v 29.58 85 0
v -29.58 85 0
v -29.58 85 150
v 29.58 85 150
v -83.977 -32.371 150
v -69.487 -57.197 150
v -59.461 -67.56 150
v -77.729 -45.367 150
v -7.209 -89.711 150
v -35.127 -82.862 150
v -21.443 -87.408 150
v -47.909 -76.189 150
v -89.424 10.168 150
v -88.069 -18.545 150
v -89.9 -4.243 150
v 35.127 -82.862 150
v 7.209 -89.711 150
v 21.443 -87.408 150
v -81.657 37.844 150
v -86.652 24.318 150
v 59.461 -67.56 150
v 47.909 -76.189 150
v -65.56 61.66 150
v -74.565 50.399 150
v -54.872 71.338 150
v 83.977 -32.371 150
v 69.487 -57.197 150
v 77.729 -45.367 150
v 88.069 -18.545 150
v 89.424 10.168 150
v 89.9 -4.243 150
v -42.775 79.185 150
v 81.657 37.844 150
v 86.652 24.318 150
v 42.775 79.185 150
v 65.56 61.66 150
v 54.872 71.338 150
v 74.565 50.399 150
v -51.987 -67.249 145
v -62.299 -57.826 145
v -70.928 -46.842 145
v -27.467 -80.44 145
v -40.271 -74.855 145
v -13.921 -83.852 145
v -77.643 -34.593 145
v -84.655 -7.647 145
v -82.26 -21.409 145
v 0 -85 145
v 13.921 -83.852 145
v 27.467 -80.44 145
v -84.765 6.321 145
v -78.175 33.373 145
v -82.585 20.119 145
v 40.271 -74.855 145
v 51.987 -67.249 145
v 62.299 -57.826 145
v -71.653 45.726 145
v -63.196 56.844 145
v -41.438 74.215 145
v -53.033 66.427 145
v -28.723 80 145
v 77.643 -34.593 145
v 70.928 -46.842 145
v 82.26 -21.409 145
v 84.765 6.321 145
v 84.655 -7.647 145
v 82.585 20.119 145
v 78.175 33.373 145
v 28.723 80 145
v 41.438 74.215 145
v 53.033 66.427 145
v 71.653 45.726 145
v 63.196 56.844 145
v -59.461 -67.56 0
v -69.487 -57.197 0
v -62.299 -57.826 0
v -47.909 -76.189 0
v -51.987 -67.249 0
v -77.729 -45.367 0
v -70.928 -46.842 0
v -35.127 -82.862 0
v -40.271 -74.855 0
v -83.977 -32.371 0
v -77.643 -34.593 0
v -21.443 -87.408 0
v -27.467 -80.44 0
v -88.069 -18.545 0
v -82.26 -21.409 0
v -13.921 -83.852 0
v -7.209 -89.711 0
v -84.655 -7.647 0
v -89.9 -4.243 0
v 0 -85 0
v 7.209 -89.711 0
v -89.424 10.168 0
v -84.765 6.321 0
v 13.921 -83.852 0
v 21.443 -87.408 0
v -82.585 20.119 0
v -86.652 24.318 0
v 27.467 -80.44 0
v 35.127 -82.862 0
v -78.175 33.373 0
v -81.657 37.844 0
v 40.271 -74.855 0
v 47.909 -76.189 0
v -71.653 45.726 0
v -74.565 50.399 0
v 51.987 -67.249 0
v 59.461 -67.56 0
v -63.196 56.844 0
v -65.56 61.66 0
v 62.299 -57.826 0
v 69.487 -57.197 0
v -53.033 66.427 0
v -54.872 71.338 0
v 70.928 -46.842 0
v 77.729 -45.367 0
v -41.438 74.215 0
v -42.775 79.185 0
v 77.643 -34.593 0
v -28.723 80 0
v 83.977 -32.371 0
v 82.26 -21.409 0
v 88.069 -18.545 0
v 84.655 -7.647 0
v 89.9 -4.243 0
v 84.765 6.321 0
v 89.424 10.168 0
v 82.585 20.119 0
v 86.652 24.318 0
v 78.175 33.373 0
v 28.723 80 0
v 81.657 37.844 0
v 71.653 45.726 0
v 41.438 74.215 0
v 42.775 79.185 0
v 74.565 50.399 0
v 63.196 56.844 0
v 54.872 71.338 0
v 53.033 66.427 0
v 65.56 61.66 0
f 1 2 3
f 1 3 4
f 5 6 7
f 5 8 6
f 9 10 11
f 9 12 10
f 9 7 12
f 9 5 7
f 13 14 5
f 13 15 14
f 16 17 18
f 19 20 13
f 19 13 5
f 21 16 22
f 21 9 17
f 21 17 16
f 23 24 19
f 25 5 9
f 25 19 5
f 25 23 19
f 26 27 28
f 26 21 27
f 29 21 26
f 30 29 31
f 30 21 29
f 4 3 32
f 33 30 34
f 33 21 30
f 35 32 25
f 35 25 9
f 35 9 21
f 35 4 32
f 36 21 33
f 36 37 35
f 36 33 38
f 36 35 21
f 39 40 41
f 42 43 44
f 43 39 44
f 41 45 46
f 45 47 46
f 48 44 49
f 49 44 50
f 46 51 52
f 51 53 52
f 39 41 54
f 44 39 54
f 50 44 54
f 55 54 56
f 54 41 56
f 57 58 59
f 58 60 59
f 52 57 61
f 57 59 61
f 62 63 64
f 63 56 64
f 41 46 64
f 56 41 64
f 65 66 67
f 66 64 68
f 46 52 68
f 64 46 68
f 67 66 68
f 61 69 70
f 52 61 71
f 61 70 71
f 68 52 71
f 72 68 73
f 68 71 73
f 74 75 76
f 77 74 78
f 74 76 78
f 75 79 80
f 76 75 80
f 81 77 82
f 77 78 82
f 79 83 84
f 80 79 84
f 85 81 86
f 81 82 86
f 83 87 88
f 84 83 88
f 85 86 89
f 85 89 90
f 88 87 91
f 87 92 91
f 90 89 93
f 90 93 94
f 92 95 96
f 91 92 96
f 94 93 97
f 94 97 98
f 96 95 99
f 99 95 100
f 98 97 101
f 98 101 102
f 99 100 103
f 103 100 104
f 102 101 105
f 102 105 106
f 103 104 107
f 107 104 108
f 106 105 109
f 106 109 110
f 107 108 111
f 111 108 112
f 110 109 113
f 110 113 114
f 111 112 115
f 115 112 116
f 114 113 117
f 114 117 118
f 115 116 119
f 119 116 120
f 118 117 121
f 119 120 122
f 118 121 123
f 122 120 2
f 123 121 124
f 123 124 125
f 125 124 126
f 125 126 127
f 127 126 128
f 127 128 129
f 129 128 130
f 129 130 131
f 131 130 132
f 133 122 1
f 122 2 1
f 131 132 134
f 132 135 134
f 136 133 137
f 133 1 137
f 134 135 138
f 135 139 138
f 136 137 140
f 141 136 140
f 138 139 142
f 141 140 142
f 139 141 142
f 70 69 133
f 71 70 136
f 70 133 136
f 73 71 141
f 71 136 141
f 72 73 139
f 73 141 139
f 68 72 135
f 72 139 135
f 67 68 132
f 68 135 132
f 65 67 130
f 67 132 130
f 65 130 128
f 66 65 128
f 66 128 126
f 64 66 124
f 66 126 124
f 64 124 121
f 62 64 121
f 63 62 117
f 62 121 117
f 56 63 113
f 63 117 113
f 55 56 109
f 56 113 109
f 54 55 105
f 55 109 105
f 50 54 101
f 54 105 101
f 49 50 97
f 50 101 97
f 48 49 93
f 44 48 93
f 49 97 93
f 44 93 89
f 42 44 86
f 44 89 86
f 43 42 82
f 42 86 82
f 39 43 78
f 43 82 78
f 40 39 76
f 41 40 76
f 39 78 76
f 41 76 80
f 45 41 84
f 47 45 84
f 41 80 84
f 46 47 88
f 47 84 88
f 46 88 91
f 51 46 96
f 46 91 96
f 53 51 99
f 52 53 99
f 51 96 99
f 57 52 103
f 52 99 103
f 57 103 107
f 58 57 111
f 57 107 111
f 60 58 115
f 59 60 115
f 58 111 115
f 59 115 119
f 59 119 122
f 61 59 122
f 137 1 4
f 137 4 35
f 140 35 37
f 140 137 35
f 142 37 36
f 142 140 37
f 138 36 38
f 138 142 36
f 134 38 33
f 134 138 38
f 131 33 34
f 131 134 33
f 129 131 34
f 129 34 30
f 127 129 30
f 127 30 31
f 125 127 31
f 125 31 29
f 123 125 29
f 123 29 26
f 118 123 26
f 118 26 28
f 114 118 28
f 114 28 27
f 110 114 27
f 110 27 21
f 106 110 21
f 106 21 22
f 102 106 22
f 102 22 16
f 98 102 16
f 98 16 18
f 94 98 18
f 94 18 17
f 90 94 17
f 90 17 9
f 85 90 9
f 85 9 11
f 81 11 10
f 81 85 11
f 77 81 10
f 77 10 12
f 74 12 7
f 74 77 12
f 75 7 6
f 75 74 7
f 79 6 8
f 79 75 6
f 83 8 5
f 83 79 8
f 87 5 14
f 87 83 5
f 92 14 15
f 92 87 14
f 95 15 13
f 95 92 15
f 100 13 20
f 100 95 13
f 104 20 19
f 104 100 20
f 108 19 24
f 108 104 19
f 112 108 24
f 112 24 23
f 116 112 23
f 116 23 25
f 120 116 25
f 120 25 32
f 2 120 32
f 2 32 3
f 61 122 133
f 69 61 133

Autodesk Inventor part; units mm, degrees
ref_plane "XZ Plane" through (0, 0, 0) normal (0, 1, 0) x (-1, 0, 0)
ref_plane "XY Plane" through (0, 0, 0) normal (0, 0, 1) x (1, 0, 0)
sketch "Skizze1" plane through (0, 0, 0) normal (0, 0, 1) x (1, 0, 0)
  arc A0 (-29.5804, 85) -> (29.5804, 85) centre (0, 0) ccw
  line L0 (0, 120) -> (0, -125) projected
  line L1 (-126, 0) -> (126, 0) projected
  line L2 (-29.5804, 85) -> (29.5804, 85)
  dimension "d0" = 180
  dimension "d1" = 85
extrude "Extrusion1" add sketch "Skizze1" along normal blind 150
shell "Wandstärke1" thickness 5 removed faces 1 at (-9.8601, -16.0312, 0)
ref_plane "Arbeitsebene1" through (0, 0, 0) normal (1, 0, 0) x (0, 1, 0)
properties part number "Testmasse"
